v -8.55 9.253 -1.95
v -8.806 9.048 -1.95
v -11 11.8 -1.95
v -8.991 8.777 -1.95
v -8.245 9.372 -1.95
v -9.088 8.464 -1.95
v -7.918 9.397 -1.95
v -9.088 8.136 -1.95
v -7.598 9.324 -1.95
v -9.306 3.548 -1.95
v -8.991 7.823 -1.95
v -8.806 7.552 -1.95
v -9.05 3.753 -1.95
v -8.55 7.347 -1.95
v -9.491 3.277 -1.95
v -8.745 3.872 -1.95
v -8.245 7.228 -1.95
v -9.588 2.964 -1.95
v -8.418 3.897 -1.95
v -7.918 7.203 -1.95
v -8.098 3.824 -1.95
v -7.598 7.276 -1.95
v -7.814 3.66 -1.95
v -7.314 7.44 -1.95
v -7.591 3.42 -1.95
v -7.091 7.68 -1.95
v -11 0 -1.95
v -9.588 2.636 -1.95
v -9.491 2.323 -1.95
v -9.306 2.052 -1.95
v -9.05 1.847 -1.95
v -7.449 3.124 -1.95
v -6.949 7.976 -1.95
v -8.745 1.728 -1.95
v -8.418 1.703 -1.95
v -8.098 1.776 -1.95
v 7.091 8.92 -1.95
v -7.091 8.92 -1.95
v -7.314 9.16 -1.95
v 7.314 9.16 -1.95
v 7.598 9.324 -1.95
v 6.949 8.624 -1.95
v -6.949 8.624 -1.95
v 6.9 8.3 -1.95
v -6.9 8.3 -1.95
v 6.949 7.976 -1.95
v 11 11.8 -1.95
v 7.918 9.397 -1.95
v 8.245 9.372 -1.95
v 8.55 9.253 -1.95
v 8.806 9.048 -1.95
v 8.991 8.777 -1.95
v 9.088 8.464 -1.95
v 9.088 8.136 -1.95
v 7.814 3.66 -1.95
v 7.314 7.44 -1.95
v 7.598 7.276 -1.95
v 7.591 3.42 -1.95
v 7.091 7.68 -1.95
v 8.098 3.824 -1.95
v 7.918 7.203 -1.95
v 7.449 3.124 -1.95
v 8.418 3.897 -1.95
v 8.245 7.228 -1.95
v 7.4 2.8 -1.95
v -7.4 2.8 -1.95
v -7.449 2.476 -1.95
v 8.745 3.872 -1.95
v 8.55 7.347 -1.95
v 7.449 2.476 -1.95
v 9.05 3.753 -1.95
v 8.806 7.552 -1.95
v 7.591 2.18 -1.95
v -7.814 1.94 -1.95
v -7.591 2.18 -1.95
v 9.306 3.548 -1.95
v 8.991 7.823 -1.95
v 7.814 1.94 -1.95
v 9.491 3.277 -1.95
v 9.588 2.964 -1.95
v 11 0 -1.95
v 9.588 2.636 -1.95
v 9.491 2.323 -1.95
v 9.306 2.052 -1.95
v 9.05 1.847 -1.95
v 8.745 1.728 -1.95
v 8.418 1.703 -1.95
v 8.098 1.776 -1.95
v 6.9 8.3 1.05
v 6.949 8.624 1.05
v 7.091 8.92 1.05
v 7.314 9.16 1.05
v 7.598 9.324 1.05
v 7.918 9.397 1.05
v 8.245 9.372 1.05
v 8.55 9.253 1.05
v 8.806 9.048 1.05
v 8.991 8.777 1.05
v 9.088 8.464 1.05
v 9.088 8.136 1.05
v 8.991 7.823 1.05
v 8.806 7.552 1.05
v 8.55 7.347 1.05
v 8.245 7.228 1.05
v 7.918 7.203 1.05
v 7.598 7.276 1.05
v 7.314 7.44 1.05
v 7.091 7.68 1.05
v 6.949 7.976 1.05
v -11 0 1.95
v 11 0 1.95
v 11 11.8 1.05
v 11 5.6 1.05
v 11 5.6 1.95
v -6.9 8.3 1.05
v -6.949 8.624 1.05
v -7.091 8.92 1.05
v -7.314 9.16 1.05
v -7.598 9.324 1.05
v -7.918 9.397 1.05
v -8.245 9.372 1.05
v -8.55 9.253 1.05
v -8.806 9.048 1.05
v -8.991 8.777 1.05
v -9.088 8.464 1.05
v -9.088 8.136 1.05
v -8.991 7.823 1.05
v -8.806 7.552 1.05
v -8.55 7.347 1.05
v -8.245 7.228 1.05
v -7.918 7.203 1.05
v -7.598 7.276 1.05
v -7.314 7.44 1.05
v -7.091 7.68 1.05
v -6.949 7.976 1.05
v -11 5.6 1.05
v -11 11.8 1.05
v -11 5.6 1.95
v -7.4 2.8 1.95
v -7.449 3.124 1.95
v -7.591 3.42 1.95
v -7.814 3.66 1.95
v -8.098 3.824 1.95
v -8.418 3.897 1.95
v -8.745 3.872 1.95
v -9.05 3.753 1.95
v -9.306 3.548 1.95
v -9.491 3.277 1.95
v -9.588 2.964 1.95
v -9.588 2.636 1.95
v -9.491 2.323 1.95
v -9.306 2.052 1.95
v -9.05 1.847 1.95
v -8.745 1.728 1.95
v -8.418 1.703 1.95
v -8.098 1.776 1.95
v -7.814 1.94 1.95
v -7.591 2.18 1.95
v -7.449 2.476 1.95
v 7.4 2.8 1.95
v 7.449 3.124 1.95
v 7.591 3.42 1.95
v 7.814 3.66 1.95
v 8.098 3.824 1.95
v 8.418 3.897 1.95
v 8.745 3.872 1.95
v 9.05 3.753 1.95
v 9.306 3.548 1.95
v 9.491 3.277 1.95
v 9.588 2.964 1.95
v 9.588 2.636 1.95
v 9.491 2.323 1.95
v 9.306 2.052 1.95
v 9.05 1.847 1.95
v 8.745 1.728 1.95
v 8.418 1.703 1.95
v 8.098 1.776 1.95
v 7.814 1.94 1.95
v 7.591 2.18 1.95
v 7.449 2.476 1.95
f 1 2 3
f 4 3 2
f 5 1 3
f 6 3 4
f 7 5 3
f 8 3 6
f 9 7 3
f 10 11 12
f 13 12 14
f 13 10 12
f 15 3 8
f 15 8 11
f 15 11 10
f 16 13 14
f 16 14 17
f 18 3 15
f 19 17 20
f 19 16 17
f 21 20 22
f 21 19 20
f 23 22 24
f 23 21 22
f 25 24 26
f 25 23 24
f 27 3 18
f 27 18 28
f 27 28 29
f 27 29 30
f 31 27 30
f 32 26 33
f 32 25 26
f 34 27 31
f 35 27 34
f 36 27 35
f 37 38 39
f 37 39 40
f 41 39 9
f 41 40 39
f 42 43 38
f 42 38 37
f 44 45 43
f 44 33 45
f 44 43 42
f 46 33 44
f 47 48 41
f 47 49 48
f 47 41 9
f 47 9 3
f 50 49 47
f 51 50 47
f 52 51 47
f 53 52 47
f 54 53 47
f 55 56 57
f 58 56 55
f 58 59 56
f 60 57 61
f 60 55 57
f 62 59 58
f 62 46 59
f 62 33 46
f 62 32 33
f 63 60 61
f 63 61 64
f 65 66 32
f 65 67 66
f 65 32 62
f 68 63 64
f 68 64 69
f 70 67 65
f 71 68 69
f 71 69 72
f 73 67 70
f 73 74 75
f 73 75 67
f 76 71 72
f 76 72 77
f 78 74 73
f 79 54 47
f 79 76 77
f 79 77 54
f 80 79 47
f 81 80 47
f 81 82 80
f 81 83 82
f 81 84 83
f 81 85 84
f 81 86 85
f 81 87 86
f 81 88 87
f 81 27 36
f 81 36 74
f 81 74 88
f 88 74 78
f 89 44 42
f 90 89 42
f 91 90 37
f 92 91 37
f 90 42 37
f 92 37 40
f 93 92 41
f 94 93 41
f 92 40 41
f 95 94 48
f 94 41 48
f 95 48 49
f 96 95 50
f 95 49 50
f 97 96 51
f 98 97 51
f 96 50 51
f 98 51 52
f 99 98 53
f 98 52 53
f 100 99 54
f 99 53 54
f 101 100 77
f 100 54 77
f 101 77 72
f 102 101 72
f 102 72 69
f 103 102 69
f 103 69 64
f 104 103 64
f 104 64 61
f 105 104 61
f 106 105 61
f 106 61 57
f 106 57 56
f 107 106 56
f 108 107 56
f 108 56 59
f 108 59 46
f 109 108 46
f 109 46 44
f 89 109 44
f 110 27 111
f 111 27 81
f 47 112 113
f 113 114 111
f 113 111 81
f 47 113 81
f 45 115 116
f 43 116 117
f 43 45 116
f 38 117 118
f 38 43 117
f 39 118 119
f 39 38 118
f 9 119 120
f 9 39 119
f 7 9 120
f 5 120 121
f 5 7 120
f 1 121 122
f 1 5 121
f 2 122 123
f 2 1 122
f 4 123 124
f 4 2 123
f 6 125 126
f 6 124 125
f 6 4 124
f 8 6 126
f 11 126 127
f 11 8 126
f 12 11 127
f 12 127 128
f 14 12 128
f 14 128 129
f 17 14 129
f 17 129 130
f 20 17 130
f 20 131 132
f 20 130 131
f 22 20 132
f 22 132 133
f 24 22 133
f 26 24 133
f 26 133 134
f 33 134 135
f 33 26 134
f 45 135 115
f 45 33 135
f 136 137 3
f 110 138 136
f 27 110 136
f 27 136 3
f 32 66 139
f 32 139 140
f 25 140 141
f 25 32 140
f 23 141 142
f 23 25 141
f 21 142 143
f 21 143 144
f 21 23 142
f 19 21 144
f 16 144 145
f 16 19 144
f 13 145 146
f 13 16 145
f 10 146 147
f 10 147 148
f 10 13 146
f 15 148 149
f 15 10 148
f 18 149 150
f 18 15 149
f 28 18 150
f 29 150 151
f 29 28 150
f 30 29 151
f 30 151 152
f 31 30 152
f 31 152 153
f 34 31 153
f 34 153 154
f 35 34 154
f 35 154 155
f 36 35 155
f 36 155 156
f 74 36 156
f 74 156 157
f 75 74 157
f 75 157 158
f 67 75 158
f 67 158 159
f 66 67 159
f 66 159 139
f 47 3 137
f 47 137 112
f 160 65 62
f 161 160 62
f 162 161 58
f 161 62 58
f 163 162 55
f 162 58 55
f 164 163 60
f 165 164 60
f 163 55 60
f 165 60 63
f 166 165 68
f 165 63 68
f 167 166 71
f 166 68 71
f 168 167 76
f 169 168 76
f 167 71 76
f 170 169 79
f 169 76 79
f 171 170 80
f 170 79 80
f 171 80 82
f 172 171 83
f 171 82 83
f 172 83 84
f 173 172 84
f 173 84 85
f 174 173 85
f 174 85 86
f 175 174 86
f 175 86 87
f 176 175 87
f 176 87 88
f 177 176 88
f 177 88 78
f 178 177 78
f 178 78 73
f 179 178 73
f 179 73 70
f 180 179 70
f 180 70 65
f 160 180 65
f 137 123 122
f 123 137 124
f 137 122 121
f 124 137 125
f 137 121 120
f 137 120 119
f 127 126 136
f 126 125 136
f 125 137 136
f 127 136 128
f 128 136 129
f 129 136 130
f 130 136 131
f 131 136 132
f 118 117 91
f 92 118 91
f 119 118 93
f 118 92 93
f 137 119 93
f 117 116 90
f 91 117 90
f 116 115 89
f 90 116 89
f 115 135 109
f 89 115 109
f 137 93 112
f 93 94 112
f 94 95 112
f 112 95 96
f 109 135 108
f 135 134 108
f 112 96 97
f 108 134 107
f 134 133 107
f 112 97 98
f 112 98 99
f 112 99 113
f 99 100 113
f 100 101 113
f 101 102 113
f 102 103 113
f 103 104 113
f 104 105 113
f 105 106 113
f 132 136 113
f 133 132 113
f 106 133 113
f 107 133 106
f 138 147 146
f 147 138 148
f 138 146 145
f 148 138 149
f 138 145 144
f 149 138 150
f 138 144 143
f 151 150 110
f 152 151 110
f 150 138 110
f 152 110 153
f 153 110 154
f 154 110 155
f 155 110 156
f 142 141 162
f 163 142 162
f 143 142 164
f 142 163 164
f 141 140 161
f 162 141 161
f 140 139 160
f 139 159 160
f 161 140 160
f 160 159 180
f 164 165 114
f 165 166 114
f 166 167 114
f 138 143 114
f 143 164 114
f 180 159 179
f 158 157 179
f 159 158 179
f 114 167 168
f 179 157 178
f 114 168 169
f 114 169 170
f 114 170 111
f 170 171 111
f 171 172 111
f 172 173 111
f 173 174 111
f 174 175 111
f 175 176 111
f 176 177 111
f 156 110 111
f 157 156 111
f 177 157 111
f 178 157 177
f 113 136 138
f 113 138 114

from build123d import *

# Parameters (mm, degrees)
SKETCH1_W           = 22
SKETCH1_H           = 3
BOSS_EXTRUDE1_DEPTH = 11.8
SKETCH1_3_W         = 22
SKETCH1_3_H         = 0.9
BOSS_EXTRUDE2_DEPTH = 5.6
CUT_EXTRUDE1_REACH  = 18.597
SKETCH2_R           = 1.1


with BuildPart() as part:
    # Sketch1 → Boss-Extrude1 (new body)
    with BuildSketch(Plane(origin=(0, 0, 0), x_dir=(1, 0, 0), z_dir=(0, 1, 0))):
        with Locations((0, 0.45)):
            Rectangle(SKETCH1_W, SKETCH1_H)
    extrude(amount=BOSS_EXTRUDE1_DEPTH)

    # Sketch1<3> → Boss-Extrude2 (add)
    with BuildSketch(Plane(origin=(0, 0, 0), x_dir=(1, 0, 0), z_dir=(0, 1, 0))):
        with Locations((0, -1.5)):
            Rectangle(SKETCH1_3_W, SKETCH1_3_H)
    extrude(amount=BOSS_EXTRUDE2_DEPTH)

    # Cut-Extrude1: up to this face of the body (flat: up to its plane)
    cut_extrude1_end = Plane(part.part.faces().sort_by_distance((0, 2.8, 1.95))[0])
    # Sketch2 → Cut-Extrude1 (cut, up to the picked face)
    with BuildSketch(Plane(origin=(0, 0, -1.95), x_dir=(-1, 0, 0), z_dir=(0, 0, -1)), mode=Mode.PRIVATE) as cut_extrude1_sk1:
        with Locations((-8.5, 2.8)):
            Circle(SKETCH2_R)
    cut_extrude1_tool1 = split(extrude(cut_extrude1_sk1.sketch, amount=-CUT_EXTRUDE1_REACH, mode=Mode.PRIVATE), bisect_by=cut_extrude1_end, keep=Keep.BOTH, mode=Mode.PRIVATE)
    # Sketch2 → Cut-Extrude1 (cut, up to the picked face)
    with BuildSketch(Plane(origin=(0, 0, -1.95), x_dir=(-1, 0, 0), z_dir=(0, 0, -1)), mode=Mode.PRIVATE) as cut_extrude1_sk2:
        with Locations((-8, 8.3)):
            Circle(SKETCH2_R)
    cut_extrude1_tool2 = split(extrude(cut_extrude1_sk2.sketch, amount=-CUT_EXTRUDE1_REACH, mode=Mode.PRIVATE), bisect_by=cut_extrude1_end, keep=Keep.BOTH, mode=Mode.PRIVATE)
    cut_extrude1_1 = cut_extrude1_tool1.solids().sort_by(Axis((8.5, 2.8, -1.95), (0, 0, 1)))[0]
    add(cut_extrude1_1, mode=Mode.SUBTRACT)
    cut_extrude1_2 = cut_extrude1_tool2.solids().sort_by(Axis((8, 8.3, -1.95), (0, 0, 1)))[0]
    add(cut_extrude1_2, mode=Mode.SUBTRACT)
    cut_extrude1 = cut_extrude1_1 + cut_extrude1_2  # Cut-Extrude1 as one shape, for the pattern or mirror that repeats it

    # Mirror1: Cut-Extrude1 across plane
    add(cut_extrude1.mirror(Plane(origin=(0, 0, 0), x_dir=(0, 0, 1), z_dir=(1, 0, 0))), mode=Mode.SUBTRACT)


solid = part.part
